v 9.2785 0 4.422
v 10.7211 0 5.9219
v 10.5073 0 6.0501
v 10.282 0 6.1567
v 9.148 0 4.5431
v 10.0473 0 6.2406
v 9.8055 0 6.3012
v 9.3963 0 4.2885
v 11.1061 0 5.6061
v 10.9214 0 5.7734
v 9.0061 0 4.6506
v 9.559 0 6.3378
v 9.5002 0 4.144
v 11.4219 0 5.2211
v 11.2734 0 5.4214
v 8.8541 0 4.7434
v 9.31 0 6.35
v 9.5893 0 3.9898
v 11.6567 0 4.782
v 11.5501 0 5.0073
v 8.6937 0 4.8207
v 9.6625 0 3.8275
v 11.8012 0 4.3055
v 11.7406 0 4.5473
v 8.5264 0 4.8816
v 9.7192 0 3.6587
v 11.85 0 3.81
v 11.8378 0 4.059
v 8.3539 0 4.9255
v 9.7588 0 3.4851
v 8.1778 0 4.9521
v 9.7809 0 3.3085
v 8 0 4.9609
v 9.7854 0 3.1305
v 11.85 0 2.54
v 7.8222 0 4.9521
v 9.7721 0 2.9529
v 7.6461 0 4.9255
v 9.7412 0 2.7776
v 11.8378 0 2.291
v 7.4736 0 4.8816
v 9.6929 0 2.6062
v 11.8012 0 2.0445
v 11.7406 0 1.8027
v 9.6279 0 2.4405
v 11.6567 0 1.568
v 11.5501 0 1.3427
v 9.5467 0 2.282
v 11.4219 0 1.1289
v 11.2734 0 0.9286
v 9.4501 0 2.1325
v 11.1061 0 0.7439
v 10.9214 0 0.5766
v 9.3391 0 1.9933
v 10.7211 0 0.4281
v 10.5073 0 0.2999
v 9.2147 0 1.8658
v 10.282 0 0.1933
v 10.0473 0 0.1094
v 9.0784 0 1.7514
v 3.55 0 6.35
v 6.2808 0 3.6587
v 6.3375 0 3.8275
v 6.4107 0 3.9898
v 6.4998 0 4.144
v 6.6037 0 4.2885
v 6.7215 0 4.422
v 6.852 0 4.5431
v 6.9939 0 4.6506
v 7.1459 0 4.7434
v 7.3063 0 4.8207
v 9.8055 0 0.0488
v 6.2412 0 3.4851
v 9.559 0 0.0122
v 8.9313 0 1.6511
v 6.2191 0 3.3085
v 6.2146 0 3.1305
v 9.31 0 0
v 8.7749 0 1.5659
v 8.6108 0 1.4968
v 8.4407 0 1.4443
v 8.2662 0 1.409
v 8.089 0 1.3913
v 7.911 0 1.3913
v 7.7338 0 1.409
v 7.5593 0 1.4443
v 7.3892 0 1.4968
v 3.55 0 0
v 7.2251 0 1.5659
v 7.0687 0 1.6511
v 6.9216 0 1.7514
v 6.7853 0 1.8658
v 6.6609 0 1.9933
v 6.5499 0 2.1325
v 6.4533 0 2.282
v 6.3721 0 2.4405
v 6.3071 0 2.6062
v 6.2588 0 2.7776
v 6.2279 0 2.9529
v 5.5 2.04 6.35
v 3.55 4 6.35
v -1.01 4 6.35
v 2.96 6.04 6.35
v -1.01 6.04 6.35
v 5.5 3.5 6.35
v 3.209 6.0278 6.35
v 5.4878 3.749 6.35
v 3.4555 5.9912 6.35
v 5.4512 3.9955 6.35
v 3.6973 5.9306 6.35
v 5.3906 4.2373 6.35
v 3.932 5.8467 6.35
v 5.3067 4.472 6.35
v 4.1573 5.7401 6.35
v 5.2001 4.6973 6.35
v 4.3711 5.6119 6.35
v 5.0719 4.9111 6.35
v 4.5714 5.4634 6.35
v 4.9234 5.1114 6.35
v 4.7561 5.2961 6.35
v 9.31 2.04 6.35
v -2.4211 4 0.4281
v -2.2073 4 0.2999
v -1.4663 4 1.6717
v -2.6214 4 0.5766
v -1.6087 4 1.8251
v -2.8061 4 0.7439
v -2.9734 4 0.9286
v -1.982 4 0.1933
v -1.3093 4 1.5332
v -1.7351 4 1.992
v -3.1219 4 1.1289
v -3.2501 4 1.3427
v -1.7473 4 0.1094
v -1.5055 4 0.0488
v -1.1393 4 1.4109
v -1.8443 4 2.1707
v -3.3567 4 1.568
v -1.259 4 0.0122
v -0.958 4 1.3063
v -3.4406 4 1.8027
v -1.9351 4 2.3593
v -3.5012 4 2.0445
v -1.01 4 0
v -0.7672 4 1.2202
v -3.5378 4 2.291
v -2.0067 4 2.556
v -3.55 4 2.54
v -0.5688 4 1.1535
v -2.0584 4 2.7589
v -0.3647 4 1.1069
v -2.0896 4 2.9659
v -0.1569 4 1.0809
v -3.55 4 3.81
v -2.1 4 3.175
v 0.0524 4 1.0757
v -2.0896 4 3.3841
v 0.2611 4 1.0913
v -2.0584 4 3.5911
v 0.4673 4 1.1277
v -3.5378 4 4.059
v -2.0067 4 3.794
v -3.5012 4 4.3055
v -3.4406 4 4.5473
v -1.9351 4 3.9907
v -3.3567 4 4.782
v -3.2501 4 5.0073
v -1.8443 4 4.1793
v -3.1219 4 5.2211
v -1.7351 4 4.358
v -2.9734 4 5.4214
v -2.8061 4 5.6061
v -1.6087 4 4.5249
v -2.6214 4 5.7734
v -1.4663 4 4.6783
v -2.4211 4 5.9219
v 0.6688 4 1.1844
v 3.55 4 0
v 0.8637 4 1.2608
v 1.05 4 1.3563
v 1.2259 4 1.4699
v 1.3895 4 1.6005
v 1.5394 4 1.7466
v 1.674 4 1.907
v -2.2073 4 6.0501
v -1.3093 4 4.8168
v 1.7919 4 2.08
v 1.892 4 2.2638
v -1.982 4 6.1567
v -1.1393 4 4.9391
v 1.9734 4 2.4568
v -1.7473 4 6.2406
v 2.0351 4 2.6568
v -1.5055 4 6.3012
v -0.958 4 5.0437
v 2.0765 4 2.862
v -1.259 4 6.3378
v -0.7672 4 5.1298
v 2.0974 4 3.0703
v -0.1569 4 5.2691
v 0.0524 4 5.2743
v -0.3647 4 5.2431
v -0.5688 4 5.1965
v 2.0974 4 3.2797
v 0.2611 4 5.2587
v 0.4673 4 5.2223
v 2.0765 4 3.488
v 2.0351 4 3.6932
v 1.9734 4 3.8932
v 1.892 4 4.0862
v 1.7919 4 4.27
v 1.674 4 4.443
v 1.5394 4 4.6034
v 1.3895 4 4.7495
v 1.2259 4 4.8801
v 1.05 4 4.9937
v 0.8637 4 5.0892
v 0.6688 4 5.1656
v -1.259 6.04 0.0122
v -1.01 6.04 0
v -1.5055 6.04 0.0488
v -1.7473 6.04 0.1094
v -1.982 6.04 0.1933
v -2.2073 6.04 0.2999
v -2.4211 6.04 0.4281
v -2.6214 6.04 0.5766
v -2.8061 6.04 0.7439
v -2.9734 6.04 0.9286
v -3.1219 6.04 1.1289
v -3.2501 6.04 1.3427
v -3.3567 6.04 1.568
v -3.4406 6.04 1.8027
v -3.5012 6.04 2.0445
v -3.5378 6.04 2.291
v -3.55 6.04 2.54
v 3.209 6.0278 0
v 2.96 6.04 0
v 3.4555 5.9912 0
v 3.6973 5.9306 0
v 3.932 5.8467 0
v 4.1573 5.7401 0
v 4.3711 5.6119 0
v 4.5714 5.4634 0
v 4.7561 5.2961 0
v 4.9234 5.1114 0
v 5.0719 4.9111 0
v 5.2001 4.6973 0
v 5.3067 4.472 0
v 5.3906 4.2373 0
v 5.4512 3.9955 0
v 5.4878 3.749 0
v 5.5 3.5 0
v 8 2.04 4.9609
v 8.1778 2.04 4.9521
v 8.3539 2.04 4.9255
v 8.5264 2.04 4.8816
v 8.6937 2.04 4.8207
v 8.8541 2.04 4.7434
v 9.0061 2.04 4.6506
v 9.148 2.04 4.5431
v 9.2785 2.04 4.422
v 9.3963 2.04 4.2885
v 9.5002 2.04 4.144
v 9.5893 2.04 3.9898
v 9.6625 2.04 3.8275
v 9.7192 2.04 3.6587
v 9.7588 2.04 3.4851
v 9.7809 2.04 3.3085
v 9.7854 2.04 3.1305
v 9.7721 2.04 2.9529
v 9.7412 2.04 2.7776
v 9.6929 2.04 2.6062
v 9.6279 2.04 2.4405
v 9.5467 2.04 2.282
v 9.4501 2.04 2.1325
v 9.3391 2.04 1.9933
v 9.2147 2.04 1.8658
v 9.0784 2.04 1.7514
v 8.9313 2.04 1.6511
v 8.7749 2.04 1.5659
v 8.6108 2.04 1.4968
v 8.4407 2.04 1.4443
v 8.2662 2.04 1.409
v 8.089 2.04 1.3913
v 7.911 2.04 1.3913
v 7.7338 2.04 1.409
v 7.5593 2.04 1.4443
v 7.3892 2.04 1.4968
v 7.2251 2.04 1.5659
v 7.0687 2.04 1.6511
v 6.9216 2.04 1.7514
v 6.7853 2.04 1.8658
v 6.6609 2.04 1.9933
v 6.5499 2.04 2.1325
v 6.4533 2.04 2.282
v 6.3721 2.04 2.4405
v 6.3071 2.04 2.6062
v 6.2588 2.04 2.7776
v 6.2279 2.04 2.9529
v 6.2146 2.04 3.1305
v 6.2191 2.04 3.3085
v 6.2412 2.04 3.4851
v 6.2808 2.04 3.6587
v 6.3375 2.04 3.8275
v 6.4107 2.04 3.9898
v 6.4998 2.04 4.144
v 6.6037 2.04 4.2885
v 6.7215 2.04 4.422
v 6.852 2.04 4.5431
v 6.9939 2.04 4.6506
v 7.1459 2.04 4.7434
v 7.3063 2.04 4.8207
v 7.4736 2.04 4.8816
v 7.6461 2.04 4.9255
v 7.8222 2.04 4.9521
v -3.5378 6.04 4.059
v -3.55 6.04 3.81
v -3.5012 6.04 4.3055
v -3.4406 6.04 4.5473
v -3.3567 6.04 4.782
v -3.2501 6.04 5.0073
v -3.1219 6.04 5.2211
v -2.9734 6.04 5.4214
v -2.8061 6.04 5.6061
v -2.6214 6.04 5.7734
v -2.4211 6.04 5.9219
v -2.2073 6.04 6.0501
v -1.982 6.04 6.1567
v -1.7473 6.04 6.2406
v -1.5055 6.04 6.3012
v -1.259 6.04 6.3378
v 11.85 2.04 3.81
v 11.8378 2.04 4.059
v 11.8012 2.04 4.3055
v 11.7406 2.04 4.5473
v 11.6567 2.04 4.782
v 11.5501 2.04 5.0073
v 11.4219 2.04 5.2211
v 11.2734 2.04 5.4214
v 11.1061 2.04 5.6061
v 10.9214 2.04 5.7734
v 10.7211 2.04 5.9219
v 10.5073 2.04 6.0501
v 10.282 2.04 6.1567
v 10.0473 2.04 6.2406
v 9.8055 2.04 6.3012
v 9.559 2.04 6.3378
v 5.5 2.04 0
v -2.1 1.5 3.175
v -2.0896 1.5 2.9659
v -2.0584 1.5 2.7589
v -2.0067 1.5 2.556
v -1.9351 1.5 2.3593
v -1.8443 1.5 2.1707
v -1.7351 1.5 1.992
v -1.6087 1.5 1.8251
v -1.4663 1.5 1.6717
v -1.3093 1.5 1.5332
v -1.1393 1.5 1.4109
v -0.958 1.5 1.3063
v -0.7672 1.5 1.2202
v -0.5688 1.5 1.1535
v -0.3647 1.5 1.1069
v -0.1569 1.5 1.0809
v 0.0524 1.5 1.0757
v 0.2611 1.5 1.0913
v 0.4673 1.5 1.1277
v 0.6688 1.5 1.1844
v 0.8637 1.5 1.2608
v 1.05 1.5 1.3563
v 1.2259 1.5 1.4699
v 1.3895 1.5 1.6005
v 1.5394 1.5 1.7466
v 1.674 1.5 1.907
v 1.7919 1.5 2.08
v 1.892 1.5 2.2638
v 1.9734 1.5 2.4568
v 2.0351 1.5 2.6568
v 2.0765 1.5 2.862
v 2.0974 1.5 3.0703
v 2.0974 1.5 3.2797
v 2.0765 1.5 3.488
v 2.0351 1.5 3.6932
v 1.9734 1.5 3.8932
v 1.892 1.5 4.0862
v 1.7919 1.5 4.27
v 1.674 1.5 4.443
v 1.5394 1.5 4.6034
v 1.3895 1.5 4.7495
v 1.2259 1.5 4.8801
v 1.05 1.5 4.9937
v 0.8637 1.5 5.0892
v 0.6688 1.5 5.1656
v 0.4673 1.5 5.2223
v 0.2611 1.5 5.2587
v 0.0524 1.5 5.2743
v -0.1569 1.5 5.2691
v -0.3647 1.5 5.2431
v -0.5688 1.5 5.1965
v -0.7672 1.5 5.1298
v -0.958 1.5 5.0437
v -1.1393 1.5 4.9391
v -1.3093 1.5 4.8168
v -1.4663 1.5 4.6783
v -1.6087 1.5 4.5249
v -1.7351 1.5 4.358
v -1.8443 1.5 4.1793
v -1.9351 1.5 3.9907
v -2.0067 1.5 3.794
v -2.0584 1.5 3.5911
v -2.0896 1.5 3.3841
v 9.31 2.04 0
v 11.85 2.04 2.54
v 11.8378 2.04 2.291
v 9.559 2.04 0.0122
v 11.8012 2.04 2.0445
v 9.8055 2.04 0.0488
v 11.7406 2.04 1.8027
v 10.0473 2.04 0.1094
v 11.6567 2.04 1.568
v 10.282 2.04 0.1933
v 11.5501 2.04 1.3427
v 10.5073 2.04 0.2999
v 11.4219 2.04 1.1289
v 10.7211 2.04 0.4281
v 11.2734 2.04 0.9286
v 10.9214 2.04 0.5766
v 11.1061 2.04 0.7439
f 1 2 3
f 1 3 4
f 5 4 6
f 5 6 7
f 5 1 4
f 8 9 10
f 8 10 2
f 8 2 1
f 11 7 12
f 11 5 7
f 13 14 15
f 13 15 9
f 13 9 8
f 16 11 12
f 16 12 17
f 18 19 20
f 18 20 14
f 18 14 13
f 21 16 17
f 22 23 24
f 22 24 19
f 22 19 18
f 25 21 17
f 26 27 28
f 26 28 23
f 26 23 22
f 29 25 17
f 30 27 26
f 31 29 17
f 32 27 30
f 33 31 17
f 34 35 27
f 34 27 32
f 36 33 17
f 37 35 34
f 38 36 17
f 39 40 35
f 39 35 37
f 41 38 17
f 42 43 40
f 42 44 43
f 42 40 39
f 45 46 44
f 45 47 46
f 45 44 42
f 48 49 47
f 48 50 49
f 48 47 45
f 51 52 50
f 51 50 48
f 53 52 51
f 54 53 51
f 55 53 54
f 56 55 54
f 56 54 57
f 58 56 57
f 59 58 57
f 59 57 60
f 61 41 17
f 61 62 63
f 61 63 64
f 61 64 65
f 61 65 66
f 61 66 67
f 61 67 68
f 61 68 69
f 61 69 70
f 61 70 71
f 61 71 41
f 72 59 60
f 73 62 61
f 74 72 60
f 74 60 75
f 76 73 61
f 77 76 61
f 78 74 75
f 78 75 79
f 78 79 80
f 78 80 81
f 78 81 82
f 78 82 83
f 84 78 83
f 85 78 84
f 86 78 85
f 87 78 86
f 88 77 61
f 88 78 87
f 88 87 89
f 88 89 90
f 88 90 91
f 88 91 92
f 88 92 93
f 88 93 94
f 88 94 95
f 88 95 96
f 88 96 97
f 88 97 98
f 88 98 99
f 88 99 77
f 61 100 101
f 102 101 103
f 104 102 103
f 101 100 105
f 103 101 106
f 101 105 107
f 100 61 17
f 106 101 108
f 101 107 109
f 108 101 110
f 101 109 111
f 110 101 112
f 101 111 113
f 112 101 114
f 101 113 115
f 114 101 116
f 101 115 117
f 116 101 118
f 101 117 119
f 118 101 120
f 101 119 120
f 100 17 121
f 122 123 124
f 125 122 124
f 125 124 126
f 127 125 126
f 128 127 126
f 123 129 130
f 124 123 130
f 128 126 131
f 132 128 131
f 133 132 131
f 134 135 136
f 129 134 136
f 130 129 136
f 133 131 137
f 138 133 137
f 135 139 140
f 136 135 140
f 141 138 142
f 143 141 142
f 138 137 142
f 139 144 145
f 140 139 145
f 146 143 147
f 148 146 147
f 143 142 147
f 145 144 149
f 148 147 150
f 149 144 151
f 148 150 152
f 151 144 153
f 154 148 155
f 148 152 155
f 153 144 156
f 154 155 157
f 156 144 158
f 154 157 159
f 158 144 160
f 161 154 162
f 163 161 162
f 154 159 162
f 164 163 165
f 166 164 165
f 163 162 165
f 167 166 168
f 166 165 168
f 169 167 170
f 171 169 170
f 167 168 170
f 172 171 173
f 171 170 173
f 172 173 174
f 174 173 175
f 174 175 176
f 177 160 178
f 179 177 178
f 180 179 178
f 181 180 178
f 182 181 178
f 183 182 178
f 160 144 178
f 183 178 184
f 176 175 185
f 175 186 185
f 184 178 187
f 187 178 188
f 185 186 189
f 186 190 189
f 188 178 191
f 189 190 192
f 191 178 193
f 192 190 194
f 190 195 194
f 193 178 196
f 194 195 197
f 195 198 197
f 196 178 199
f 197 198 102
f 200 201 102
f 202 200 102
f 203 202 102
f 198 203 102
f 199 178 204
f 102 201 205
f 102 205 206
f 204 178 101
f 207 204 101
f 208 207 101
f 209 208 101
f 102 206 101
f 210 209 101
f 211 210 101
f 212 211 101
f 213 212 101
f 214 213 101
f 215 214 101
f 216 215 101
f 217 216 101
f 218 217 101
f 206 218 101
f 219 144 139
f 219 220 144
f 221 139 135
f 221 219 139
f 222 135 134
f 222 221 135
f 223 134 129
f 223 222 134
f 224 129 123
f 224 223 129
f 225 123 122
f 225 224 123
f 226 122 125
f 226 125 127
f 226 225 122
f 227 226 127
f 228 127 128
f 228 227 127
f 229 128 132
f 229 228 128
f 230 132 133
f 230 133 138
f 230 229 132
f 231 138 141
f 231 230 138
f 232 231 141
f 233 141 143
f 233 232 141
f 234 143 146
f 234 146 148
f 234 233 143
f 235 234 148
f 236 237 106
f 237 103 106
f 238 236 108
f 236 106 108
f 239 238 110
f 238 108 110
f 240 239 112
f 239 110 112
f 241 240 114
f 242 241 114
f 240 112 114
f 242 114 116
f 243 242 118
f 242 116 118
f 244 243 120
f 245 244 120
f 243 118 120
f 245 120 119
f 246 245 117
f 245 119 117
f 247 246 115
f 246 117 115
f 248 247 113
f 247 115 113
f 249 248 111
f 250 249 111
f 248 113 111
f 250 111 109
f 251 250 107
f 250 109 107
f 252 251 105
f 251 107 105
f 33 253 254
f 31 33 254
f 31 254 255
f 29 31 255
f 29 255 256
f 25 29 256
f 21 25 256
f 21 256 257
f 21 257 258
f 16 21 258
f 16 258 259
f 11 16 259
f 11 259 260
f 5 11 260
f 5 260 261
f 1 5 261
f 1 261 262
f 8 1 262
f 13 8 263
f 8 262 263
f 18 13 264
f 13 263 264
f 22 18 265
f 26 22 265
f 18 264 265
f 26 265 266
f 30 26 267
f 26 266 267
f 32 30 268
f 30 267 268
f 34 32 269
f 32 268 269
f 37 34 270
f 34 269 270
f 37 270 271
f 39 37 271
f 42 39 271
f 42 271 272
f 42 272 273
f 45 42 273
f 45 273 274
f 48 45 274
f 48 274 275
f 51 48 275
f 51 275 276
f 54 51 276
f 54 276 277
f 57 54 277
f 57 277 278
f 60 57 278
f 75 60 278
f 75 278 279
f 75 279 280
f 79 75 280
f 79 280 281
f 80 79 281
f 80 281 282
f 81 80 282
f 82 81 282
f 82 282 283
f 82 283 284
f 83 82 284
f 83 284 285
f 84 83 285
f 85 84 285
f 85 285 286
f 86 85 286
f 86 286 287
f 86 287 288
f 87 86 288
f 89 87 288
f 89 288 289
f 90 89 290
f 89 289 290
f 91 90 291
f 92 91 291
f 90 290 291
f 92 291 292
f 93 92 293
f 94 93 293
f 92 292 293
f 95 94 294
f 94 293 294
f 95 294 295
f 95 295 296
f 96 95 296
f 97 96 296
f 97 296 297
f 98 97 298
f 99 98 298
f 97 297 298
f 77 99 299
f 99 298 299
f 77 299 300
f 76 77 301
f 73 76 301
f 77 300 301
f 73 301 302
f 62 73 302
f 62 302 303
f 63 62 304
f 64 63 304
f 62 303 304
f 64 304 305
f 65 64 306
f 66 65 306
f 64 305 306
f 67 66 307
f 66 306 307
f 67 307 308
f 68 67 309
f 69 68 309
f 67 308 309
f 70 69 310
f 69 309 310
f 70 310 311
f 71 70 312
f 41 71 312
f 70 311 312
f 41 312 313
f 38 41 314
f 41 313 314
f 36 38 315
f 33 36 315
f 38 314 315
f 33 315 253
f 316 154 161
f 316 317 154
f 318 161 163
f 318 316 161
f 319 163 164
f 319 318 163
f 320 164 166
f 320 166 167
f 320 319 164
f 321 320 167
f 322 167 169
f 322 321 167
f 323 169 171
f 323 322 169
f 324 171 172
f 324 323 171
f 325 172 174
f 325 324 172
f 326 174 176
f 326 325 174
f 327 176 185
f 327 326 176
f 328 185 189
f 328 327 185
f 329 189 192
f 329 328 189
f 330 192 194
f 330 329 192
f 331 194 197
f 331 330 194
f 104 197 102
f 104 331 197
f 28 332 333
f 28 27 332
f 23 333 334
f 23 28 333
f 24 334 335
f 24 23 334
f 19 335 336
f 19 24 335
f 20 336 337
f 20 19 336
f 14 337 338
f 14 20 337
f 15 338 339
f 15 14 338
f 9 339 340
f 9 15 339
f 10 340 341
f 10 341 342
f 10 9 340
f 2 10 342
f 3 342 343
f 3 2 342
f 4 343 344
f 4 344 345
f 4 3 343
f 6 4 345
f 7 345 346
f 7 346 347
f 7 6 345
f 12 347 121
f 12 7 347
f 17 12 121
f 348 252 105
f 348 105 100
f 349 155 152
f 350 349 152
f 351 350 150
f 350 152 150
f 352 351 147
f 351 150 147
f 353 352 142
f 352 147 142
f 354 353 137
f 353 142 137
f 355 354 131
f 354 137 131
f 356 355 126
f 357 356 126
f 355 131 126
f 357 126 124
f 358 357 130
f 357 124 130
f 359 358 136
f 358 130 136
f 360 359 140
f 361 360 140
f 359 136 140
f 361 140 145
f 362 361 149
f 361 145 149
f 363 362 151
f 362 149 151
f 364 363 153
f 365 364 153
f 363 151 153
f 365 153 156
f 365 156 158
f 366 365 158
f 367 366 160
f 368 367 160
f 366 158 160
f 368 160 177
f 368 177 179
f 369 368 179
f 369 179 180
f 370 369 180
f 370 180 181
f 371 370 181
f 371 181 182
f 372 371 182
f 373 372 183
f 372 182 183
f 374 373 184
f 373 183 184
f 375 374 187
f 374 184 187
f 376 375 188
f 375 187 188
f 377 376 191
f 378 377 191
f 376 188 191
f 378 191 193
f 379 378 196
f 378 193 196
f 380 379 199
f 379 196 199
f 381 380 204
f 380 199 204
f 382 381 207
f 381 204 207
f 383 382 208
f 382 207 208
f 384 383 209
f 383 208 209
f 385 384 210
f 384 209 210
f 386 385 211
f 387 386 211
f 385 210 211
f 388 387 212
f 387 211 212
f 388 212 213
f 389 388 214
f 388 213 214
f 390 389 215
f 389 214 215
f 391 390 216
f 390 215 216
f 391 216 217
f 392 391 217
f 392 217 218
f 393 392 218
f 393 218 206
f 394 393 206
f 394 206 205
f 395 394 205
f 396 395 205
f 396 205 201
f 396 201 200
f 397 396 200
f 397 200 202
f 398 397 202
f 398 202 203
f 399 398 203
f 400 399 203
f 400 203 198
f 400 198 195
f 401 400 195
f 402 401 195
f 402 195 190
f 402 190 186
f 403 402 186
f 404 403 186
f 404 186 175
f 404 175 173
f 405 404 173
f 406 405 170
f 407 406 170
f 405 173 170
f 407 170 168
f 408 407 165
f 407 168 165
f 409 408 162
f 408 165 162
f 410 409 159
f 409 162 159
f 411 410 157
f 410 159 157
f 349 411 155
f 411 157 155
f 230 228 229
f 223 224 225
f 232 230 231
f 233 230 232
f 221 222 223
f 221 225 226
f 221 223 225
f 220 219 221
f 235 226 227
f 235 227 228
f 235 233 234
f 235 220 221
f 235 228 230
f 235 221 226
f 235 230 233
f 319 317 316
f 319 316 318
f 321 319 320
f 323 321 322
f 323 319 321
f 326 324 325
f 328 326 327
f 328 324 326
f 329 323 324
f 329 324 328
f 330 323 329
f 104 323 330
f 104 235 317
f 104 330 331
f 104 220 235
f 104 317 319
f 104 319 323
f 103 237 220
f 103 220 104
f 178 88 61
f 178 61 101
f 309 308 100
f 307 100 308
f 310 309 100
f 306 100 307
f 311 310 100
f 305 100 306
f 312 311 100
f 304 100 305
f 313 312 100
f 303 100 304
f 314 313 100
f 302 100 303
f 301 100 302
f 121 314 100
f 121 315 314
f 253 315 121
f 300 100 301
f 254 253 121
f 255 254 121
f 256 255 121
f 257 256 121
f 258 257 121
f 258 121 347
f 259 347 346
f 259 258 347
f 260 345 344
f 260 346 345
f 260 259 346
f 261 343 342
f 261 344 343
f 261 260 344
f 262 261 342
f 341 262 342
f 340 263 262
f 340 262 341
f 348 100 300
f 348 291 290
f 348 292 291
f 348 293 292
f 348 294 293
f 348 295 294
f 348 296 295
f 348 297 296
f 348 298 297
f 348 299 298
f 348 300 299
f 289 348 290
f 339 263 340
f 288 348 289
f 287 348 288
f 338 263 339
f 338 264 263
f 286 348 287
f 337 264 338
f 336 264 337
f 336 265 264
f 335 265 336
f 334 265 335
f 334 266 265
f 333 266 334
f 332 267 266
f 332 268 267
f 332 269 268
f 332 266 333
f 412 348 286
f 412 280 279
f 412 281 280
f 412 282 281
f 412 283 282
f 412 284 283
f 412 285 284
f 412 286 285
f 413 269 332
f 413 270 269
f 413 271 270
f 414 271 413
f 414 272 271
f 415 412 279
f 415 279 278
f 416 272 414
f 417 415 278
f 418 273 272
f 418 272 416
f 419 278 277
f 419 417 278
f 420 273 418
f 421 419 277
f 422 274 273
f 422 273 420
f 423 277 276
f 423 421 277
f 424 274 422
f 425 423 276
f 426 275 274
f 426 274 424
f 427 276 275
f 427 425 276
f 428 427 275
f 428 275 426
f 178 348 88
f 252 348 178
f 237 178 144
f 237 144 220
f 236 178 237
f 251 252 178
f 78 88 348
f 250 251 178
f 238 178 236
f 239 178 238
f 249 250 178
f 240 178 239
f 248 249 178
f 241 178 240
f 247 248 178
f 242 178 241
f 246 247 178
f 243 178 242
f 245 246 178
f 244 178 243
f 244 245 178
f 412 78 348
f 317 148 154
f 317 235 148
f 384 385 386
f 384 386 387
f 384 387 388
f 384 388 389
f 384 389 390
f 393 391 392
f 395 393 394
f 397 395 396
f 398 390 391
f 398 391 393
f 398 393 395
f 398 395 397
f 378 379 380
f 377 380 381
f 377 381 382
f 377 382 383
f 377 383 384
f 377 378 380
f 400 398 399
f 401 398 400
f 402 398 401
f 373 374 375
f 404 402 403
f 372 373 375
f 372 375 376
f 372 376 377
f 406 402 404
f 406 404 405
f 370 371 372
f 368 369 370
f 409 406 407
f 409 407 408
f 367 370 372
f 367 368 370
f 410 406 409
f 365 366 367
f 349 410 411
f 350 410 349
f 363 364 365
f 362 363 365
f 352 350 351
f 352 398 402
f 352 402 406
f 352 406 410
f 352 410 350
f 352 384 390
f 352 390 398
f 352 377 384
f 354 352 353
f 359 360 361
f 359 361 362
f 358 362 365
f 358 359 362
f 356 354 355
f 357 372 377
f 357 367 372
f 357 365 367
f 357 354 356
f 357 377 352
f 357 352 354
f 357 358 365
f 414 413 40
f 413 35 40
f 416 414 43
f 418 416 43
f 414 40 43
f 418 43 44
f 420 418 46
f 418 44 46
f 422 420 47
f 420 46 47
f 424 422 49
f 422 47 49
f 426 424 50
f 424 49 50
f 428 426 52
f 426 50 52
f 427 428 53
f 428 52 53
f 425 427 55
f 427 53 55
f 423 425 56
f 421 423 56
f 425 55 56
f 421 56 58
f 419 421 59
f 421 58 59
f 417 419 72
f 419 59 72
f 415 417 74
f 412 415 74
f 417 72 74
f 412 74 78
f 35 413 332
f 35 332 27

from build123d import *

# Parameters (mm, degrees)
BOSS_EXTRUDE1_DEPTH = 6.35
FILLET1_R           = 2.54
CUT_EXTRUDE1_REACH  = 16.027
SKETCH2_R           = 1.7859375
SKETCH4_W           = 6.35
SKETCH4_H           = 2.04
BOSS_EXTRUDE3_DEPTH = 3.55
SKETCH6_R           = 2.1
BOSS_EXTRUDE5_DEPTH = 2.5
FILLET3_R           = 2.54


with BuildPart() as part:
    # Sketch1 → Boss-Extrude1 (new body)
    with BuildSketch(Plane.XY):
        Polygon((0, 6.04), (5.5, 6.04), (5.5, 2.04), (11.85, 2.04), (11.85, 0), (3.55, 0), (3.55, 4), (0, 4), align=None)
    extrude(amount=BOSS_EXTRUDE1_DEPTH)

    # Fillet1
    fillet1_edges = [part.edges().sort_by_distance(p)[0] for p in [
        (5.5, 6.04, 3.175),
        (11.85, 1.02, 6.35),
        (11.85, 1.02, 0),
    ]]
    fillet(fillet1_edges, radius=FILLET1_R)

    # Sketch2 → Cut-Extrude1 (cut, up to next)
    with BuildSketch(Plane(origin=(0, 2.04, 0), x_dir=(1, 0, 0), z_dir=(0, 1, 0)), mode=Mode.PRIVATE) as cut_extrude1_sk1:
        with Locations(Location((8, -3.175, 0), (0, 0, 270))):
            Circle(SKETCH2_R)
    cut_extrude1_tool1 = extrude(cut_extrude1_sk1.sketch, amount=-CUT_EXTRUDE1_REACH, mode=Mode.PRIVATE) & part.part
    add(cut_extrude1_tool1.solids().sort_by_distance((8, 2.04, 3.175))[0], mode=Mode.SUBTRACT)

    # Sketch4 → Boss-Extrude3 (add)
    with BuildSketch(Plane.ZY):
        with Locations((3.175, 5.02)):
            Rectangle(SKETCH4_W, SKETCH4_H)
    extrude(amount=BOSS_EXTRUDE3_DEPTH)

    # Sketch6 → Boss-Extrude5 (add)
    with BuildSketch(Plane.XZ.offset(-4)):
        with Locations(Location((0, 3.175, 0), (0, 0, 180))):
            Circle(SKETCH6_R)
    extrude(amount=BOSS_EXTRUDE5_DEPTH)

    # Fillet3
    fillet3_edges = [part.edges().sort_by_distance(p)[0] for p in [
        (-3.55, 5.02, 6.35),
        (-3.55, 5.02, 0),
    ]]
    fillet(fillet3_edges, radius=FILLET3_R)


solid = part.part
